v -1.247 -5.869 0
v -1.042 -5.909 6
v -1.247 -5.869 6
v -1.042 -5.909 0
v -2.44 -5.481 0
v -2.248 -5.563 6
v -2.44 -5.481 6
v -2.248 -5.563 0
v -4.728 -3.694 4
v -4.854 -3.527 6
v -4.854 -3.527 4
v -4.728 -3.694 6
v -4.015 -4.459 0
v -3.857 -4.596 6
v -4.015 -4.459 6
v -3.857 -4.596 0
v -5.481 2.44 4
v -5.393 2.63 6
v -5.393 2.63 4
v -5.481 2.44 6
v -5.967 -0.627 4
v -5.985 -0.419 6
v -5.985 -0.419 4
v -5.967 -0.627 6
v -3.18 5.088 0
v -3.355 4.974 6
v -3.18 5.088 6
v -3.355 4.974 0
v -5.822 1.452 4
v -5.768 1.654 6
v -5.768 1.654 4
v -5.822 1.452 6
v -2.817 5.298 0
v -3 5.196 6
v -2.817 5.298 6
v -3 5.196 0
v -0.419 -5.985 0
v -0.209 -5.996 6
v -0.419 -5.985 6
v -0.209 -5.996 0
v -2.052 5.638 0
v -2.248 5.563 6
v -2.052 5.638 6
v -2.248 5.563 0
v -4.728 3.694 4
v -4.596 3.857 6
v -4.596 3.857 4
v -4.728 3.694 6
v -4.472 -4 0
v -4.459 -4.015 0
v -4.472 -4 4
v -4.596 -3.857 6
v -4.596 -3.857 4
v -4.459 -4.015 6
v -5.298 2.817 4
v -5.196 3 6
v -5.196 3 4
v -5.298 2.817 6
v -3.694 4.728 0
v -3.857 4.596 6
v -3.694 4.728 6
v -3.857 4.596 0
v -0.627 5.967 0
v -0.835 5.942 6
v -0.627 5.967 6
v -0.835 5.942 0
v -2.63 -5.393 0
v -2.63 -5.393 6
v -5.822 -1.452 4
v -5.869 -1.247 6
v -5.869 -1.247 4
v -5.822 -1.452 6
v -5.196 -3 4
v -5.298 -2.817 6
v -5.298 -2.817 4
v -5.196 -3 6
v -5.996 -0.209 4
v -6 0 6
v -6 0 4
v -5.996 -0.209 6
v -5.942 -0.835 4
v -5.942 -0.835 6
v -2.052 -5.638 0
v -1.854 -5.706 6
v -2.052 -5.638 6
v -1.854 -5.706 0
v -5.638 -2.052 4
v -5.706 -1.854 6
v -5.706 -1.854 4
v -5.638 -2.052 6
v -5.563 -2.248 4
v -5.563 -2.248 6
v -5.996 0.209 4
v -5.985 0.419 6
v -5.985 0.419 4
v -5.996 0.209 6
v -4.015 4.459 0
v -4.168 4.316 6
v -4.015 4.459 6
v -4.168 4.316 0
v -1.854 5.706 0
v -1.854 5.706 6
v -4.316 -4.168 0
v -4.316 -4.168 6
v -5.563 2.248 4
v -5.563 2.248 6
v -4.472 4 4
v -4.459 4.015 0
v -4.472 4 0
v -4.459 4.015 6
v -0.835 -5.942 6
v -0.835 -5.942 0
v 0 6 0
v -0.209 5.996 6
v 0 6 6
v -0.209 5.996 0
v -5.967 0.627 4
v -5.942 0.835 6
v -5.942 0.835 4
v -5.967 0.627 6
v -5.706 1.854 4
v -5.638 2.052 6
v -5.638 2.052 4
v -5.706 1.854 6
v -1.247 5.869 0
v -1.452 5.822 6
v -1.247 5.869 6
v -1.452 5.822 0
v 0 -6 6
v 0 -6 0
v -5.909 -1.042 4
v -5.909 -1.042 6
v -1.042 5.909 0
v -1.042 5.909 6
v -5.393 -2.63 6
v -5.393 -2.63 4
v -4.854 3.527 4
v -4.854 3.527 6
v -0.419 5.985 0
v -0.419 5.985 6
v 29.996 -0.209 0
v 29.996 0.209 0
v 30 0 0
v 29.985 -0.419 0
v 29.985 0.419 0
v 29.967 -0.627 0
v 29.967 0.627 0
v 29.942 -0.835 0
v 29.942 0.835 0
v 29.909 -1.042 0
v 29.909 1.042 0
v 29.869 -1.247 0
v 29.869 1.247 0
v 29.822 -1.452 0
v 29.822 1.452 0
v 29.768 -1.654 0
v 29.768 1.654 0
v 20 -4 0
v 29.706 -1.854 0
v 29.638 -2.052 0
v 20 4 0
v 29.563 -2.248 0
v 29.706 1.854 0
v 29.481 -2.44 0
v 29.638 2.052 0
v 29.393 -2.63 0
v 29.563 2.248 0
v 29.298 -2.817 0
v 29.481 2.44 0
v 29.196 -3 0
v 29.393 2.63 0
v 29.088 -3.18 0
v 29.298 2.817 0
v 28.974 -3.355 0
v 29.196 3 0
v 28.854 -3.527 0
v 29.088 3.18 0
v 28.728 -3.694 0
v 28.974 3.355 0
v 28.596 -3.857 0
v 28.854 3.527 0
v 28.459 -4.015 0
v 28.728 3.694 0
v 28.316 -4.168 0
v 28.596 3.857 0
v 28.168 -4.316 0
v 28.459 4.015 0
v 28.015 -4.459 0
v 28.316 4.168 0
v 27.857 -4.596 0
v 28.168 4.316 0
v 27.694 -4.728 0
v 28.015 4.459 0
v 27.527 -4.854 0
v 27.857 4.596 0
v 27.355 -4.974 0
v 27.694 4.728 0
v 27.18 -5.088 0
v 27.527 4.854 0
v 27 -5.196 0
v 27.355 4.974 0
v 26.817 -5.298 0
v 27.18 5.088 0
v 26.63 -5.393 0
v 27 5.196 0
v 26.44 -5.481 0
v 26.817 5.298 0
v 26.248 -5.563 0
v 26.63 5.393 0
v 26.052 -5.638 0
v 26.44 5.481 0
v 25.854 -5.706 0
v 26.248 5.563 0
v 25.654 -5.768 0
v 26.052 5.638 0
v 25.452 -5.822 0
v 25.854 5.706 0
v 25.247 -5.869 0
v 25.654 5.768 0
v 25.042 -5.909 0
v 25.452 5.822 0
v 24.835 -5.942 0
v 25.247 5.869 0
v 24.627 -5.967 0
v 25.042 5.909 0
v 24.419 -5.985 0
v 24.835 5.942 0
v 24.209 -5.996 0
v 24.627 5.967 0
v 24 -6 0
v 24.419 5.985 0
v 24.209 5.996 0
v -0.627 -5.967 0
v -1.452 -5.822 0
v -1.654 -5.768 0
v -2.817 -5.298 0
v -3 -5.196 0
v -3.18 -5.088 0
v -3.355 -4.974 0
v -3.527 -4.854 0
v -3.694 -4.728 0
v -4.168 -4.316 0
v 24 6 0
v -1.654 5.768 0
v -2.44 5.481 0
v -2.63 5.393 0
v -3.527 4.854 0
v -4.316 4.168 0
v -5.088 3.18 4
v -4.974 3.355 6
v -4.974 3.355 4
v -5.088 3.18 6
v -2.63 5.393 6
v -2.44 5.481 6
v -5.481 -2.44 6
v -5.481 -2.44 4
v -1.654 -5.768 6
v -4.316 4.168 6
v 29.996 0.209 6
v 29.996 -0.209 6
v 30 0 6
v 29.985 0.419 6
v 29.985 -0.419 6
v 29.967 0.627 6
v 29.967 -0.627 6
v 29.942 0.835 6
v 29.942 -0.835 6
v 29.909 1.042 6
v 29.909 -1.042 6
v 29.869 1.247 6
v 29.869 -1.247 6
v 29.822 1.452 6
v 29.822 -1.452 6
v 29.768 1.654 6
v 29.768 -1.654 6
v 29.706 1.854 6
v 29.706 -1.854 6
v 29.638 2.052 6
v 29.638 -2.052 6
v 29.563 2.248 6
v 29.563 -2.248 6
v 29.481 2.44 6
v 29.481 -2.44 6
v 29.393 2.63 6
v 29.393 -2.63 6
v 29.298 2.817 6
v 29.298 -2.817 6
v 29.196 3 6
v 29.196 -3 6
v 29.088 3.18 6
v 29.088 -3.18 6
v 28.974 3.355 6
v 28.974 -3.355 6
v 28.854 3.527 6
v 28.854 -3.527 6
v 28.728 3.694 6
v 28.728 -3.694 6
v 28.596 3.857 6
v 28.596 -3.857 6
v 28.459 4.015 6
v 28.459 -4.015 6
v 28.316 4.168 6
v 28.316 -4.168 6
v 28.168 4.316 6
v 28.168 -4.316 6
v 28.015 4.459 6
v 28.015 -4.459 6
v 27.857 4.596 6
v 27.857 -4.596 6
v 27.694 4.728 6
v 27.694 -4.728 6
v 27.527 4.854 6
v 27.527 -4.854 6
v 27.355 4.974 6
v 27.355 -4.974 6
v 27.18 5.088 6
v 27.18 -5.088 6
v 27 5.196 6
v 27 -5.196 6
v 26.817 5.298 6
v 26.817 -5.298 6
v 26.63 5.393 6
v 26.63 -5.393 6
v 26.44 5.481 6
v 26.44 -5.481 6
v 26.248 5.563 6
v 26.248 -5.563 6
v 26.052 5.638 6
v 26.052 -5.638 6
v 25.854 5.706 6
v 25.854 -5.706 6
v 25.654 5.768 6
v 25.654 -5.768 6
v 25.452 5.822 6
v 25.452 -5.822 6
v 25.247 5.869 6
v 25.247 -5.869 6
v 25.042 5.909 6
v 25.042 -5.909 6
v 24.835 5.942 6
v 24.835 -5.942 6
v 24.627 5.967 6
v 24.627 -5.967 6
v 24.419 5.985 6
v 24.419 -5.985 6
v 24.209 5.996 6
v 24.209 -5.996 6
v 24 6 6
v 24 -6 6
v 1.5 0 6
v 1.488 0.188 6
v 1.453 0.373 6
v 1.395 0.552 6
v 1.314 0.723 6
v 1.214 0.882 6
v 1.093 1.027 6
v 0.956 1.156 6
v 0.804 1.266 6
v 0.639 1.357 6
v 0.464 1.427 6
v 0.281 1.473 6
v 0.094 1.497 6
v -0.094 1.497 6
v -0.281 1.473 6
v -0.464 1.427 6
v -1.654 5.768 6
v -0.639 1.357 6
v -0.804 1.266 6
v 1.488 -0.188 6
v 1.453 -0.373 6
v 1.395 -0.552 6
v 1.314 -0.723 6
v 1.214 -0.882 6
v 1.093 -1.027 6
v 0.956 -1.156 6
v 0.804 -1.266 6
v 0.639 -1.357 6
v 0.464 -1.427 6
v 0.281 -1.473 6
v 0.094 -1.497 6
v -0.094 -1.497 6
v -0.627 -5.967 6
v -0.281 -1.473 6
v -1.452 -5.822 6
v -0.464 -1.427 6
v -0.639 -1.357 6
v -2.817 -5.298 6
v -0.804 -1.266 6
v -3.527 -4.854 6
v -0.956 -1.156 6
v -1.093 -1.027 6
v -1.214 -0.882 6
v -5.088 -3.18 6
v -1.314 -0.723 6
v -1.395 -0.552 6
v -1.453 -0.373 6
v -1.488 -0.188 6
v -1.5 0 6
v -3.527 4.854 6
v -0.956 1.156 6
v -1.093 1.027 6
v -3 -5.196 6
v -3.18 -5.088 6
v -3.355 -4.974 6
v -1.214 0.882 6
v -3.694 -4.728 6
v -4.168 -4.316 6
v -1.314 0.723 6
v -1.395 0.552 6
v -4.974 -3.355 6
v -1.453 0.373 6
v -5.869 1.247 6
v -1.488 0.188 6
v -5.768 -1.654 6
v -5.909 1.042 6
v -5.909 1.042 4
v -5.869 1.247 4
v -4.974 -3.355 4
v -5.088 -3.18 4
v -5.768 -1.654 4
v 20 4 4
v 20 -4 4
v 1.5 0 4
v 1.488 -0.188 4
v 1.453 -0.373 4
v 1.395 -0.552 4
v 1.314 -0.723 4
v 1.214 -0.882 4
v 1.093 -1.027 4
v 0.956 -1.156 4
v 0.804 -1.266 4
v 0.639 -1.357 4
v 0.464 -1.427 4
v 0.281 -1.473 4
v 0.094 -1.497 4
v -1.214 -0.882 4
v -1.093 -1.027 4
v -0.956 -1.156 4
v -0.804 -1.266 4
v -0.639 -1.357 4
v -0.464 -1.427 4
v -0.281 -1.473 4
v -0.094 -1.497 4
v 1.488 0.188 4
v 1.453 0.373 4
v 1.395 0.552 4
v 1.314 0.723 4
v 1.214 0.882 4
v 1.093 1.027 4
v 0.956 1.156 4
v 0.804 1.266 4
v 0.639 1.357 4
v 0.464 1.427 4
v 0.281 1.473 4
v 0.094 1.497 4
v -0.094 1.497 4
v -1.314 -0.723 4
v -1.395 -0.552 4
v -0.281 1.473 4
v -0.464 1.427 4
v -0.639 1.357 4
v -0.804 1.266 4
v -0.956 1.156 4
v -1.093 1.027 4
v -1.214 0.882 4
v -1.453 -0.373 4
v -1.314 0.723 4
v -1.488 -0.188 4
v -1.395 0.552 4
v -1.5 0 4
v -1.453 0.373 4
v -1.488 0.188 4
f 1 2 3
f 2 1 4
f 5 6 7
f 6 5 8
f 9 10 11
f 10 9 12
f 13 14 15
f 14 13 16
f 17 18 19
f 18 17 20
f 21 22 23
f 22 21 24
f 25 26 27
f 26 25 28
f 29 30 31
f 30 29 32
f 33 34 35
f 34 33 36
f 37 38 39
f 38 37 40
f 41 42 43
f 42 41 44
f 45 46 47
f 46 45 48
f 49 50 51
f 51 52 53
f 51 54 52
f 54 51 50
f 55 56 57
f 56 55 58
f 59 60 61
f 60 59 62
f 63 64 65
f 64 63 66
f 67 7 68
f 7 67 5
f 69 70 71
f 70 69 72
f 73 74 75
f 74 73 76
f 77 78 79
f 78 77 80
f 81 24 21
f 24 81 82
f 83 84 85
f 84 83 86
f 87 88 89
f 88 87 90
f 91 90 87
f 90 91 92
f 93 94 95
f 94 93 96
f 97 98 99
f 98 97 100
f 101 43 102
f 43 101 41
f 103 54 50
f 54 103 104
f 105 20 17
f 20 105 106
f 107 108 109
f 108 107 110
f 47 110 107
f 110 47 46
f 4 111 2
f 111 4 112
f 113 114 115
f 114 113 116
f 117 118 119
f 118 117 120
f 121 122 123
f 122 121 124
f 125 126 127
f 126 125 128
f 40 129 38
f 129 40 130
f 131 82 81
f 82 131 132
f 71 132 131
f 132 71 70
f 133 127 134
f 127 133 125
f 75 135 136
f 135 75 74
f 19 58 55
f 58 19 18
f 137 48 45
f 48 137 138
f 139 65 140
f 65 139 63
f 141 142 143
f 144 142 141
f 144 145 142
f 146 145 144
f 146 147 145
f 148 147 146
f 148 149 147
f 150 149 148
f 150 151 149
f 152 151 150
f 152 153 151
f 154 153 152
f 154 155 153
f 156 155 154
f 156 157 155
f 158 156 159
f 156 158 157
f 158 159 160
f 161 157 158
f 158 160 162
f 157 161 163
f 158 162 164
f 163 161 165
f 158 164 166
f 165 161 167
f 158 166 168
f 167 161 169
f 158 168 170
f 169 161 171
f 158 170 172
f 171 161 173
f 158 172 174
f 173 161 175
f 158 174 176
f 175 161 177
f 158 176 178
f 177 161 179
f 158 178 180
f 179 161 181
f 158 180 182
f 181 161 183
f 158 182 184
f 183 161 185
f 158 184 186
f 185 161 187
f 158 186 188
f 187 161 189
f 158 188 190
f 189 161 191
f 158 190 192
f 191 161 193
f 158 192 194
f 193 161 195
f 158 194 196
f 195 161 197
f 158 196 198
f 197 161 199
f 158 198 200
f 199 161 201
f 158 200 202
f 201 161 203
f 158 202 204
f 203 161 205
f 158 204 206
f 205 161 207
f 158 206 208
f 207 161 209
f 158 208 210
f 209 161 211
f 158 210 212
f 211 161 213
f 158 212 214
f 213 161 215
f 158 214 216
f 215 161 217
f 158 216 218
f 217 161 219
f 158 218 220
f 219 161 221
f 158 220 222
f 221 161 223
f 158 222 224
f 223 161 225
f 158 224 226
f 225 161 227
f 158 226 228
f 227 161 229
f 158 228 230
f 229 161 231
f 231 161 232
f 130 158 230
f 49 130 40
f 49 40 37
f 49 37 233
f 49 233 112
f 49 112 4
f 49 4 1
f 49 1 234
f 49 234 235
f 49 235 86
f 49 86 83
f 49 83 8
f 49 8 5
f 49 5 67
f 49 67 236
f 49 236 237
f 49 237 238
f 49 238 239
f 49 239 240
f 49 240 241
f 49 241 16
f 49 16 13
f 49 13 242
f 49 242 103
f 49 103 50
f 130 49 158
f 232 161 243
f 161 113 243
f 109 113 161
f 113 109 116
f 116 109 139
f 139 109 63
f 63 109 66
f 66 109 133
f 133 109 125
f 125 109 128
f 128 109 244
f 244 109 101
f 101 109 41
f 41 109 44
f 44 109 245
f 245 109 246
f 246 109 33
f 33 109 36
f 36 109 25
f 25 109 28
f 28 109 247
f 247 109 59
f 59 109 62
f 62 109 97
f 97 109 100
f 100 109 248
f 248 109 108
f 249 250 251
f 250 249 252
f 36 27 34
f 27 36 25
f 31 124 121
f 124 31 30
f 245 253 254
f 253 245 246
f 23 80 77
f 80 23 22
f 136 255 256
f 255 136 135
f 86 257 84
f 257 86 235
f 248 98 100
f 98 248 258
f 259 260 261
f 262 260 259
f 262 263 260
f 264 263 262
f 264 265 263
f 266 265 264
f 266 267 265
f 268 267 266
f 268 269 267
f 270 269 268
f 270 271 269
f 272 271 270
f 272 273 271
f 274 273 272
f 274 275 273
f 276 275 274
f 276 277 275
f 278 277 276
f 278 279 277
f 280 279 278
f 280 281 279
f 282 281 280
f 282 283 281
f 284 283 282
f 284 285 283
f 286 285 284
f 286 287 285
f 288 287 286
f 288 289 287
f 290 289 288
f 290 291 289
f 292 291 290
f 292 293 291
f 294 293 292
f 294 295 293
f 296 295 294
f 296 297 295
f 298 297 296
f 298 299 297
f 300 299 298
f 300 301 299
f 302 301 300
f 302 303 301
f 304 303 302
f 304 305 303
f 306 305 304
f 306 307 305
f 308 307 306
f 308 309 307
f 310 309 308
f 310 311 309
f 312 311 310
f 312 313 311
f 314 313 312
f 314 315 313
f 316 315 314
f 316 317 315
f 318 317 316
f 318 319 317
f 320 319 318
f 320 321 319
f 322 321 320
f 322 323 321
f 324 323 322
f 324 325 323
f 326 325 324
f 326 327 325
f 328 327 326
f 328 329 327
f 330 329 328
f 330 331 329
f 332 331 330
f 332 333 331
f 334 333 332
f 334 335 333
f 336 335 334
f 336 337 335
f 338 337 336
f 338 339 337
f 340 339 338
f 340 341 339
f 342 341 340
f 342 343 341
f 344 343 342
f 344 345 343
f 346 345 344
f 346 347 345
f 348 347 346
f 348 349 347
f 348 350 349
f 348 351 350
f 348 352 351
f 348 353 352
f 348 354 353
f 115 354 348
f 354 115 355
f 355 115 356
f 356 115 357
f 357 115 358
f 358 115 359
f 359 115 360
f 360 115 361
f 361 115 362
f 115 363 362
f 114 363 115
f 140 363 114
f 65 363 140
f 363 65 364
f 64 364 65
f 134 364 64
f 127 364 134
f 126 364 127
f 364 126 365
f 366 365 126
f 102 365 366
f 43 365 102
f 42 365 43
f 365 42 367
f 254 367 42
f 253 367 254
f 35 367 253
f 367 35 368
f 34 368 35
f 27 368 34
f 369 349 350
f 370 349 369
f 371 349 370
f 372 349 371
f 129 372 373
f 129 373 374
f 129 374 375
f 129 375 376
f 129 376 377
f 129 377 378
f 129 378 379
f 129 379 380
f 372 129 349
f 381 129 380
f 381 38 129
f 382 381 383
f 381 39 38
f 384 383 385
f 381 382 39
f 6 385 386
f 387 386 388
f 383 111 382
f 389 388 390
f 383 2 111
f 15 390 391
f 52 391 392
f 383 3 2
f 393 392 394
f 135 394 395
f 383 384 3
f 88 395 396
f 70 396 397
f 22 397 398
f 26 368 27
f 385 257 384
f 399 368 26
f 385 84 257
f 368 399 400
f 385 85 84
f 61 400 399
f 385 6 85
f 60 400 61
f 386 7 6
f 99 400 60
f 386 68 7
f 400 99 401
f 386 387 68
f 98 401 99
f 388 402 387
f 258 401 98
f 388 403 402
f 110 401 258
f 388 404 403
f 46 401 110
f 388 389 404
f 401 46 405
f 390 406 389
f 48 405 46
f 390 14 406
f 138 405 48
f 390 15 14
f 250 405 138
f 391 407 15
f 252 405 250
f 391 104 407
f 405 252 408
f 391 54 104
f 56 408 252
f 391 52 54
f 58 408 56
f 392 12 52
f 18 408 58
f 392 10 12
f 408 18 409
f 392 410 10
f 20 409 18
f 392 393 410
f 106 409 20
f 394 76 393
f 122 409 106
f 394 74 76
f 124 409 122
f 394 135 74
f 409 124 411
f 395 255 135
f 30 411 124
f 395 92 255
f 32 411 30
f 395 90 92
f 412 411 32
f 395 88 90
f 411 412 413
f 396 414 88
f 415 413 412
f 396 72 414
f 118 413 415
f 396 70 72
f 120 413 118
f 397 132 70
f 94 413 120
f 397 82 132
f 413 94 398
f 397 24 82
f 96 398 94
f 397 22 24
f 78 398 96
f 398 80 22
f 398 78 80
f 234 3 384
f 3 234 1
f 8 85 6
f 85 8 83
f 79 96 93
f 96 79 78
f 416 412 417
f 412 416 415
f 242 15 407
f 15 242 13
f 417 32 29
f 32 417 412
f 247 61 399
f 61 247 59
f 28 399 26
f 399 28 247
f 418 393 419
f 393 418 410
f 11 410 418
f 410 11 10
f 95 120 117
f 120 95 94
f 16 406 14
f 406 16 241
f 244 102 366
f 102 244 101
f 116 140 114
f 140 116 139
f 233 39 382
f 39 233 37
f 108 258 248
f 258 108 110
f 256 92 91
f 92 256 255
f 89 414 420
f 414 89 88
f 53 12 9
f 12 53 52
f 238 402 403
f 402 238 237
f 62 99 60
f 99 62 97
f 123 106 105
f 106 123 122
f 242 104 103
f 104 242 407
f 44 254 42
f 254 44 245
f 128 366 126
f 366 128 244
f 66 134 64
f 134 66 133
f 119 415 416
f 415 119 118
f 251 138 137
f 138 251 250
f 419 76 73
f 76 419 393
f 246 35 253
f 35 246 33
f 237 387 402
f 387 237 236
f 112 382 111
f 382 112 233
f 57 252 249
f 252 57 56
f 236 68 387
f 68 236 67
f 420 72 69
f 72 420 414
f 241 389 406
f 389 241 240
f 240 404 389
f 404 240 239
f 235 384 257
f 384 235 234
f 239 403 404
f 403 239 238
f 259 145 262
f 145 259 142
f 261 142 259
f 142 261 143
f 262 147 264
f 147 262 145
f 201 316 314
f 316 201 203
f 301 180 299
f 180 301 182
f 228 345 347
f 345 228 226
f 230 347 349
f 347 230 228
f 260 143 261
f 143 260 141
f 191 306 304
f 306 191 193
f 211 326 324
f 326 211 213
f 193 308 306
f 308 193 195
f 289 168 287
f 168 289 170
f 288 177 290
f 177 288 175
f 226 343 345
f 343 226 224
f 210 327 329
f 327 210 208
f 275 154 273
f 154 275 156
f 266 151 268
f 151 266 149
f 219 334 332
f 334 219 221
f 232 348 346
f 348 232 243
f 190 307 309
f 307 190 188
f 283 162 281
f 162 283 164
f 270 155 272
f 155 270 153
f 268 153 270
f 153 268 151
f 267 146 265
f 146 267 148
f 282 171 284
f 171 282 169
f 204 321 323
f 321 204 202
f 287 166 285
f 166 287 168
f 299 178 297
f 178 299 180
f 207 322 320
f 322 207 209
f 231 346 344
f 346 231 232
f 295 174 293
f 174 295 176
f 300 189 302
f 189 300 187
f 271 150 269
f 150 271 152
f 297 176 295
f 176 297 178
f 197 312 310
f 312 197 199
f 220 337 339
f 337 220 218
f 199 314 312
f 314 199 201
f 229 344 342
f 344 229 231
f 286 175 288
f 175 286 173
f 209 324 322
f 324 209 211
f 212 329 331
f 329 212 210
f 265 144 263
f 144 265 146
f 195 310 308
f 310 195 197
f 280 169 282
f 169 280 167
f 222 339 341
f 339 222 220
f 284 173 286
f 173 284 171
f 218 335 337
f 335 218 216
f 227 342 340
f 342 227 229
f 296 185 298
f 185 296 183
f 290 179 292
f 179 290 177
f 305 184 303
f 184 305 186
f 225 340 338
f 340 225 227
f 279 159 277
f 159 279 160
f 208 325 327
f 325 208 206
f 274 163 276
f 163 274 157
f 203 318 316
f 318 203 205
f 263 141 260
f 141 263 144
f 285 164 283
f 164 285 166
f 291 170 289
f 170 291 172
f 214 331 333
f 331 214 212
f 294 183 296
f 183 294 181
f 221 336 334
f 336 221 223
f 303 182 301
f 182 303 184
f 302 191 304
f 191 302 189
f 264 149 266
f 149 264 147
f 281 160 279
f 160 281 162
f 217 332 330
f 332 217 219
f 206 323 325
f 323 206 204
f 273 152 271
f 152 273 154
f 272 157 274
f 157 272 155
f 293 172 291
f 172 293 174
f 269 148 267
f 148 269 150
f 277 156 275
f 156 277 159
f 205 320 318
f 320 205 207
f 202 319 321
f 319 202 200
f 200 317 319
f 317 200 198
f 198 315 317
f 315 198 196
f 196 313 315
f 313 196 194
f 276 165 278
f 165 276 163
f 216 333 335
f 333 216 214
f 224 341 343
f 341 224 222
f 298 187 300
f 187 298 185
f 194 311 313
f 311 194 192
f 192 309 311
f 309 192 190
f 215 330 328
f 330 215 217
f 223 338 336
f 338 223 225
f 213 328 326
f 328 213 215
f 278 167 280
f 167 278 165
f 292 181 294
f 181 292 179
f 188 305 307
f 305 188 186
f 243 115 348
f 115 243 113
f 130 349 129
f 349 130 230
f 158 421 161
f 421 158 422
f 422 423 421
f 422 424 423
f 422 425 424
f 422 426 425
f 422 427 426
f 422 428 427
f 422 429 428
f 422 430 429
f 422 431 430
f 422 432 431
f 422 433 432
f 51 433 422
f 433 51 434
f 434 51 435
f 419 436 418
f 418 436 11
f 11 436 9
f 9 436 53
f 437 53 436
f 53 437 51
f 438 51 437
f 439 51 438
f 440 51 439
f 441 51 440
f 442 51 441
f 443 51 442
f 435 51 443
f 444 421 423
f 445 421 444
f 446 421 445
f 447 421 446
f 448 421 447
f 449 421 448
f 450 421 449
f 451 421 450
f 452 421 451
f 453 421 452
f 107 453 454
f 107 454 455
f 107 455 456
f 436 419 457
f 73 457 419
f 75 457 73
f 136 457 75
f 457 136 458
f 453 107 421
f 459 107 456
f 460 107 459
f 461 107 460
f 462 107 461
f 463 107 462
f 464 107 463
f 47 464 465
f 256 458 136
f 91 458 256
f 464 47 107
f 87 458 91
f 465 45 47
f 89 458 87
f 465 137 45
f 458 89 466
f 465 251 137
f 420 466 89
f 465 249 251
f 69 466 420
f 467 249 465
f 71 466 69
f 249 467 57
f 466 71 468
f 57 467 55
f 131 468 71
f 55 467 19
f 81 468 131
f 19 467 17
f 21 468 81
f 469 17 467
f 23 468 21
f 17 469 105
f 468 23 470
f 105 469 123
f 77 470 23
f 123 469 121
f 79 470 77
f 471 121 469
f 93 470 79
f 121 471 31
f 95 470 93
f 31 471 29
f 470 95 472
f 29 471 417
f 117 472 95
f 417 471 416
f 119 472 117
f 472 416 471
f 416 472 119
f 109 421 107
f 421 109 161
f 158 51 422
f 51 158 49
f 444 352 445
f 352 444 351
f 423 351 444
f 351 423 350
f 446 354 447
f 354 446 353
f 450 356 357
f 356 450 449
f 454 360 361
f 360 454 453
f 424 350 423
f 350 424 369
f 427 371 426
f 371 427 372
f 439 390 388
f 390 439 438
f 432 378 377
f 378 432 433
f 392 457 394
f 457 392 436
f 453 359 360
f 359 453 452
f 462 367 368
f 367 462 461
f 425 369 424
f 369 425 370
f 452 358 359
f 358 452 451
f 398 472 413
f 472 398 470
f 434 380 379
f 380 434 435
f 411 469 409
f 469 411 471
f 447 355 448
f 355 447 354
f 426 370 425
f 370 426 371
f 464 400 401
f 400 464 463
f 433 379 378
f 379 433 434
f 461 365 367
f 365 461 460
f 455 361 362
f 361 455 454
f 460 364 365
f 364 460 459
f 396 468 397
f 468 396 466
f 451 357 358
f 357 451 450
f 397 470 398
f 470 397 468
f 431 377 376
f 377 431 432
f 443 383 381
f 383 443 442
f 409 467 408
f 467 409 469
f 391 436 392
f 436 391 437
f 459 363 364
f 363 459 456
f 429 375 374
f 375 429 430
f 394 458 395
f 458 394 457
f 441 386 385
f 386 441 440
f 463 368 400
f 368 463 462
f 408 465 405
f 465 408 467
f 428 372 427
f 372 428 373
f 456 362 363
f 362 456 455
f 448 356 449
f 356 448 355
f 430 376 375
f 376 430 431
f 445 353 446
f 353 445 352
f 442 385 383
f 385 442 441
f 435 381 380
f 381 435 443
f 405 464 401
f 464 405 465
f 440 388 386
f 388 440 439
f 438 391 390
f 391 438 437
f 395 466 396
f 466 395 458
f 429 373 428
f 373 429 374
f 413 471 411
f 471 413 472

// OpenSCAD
honeh=4;

difference(){
    union(){
        cylinder(r=6,h=6,$fn=180);
        translate([30-6,0,0])
        cylinder(r=6,h=6,$fn=180);
        translate([0,-6,0])
        cube([30-6,12,6]);
    }
    union(){
        translate([-10,-4,0])
        cube([30,8,honeh]);
        cylinder(r=1.5,h=100,$fn=50);
    }
}
